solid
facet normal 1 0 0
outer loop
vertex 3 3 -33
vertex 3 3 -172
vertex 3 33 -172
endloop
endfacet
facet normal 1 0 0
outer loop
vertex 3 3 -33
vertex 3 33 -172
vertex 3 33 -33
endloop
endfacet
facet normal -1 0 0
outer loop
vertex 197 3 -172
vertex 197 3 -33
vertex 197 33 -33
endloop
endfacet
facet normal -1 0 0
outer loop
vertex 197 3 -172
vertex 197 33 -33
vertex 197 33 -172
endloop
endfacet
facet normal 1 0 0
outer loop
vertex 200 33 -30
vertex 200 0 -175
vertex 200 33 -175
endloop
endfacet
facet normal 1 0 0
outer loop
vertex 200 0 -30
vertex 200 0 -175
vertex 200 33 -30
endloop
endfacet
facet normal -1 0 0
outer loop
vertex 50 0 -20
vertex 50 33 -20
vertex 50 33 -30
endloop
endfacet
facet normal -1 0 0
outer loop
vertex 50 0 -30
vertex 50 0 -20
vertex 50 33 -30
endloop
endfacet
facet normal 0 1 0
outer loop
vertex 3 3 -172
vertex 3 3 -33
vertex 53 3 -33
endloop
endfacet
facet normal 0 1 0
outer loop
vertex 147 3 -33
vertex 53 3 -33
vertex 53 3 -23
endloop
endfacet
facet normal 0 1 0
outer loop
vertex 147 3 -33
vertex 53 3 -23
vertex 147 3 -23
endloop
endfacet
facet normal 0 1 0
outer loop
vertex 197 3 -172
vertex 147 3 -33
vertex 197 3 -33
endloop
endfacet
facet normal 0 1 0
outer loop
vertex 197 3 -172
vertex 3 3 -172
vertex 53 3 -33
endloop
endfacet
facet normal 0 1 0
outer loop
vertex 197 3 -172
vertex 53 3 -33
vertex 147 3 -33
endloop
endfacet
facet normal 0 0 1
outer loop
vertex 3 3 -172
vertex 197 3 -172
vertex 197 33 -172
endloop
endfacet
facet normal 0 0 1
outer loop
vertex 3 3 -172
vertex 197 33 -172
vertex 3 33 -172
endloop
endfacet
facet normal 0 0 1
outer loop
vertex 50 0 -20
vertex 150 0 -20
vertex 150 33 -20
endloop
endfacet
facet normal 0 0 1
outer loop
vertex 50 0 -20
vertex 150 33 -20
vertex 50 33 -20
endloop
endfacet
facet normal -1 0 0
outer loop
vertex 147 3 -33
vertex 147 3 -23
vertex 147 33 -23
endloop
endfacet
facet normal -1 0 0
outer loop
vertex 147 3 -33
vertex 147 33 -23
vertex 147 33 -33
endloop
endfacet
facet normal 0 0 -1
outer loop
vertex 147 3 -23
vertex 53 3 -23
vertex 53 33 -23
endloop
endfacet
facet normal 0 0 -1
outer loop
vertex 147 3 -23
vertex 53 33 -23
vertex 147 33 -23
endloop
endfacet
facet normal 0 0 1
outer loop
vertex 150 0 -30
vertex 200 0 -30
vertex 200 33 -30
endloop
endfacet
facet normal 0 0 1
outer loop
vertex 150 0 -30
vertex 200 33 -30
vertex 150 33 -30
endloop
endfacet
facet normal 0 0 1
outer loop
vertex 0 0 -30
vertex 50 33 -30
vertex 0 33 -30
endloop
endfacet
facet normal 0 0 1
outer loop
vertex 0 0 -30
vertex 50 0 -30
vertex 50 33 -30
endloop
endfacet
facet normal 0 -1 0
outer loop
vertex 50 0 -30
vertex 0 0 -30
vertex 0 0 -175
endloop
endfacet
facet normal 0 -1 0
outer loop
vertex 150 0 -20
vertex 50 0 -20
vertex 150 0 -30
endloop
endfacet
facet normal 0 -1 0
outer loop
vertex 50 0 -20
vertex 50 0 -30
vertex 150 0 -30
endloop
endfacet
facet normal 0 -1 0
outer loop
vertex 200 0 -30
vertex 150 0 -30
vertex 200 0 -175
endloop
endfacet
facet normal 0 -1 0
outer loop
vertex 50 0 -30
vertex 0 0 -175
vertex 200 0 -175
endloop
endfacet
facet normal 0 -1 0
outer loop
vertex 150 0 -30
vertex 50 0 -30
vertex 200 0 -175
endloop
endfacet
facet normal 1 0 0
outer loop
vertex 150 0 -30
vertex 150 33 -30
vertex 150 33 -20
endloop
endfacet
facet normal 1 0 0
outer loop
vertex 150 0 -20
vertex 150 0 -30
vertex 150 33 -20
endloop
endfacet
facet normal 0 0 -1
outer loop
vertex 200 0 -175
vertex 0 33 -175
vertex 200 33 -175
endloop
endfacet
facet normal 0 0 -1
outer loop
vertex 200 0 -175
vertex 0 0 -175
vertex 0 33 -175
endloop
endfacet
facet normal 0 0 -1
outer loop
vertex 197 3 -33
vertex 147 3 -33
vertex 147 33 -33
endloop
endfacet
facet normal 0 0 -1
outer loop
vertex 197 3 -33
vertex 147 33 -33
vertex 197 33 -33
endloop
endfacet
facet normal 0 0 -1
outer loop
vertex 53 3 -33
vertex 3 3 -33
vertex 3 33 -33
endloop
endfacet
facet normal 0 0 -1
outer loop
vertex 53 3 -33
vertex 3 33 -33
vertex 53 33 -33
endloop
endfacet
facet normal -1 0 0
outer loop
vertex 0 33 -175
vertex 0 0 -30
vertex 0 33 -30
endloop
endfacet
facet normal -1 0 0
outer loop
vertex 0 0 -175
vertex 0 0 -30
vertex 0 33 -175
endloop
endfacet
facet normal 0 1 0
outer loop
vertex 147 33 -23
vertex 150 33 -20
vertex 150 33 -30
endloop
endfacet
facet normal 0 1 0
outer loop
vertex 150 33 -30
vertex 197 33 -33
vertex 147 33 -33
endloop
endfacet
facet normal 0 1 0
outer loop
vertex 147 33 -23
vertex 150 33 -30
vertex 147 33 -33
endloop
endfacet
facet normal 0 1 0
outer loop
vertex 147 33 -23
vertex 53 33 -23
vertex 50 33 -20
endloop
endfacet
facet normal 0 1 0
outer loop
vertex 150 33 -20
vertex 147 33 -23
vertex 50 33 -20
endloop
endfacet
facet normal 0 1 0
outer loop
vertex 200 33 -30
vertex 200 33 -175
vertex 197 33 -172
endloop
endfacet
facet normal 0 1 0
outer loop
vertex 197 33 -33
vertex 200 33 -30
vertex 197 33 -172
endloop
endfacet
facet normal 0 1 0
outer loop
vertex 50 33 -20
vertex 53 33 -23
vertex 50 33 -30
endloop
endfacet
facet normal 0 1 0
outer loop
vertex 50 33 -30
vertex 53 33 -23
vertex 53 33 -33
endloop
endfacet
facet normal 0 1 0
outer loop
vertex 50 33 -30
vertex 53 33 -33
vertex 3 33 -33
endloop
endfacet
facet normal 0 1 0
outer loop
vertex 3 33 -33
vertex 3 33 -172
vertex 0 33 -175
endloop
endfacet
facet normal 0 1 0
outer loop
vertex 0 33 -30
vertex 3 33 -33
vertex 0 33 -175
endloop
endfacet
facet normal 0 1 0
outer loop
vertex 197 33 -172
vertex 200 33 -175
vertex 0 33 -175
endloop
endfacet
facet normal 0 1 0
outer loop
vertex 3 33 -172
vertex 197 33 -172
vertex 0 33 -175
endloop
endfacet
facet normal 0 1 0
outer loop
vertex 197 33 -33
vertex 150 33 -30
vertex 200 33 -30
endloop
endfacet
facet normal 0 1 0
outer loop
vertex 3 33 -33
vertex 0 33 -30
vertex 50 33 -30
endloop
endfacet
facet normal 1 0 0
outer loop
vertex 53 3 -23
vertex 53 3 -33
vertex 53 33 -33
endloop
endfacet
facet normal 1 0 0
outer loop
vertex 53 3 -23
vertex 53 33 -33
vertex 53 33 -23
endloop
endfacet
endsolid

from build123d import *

# Parameters (mm, degrees)
SALIENTE_EXTRUIR1_DEPTH = 3
SALIENTE_EXTRUIR2_DEPTH = 30


with BuildPart() as part:
    # Croquis1 → Saliente-Extruir1 (new body)
    with BuildSketch(Plane(origin=(0, 0, 0), x_dir=(1, 0, 0), z_dir=(0, 1, 0))):
        Polygon((50, 20), (150, 20), (150, 30), (200, 30), (200, 175), (0, 175), (0, 30), (50, 30), align=None)
    extrude(amount=SALIENTE_EXTRUIR1_DEPTH)

    # Croquis2 → Saliente-Extruir2 (add)
    with BuildSketch(Plane(origin=(0, 3, 0), x_dir=(1, 0, 0), z_dir=(0, 1, 0))):
        Polygon((0, 175), (200, 175), (200, 30), (150, 30), (150, 20), (50, 20), (50, 30), (0, 30), align=None)
        Polygon((197, 33), (197, 172), (3, 172), (3, 33), (53, 33), (53, 23), (147, 23), (147, 33), align=None, mode=Mode.SUBTRACT)
    extrude(amount=SALIENTE_EXTRUIR2_DEPTH)


solid = part.part
